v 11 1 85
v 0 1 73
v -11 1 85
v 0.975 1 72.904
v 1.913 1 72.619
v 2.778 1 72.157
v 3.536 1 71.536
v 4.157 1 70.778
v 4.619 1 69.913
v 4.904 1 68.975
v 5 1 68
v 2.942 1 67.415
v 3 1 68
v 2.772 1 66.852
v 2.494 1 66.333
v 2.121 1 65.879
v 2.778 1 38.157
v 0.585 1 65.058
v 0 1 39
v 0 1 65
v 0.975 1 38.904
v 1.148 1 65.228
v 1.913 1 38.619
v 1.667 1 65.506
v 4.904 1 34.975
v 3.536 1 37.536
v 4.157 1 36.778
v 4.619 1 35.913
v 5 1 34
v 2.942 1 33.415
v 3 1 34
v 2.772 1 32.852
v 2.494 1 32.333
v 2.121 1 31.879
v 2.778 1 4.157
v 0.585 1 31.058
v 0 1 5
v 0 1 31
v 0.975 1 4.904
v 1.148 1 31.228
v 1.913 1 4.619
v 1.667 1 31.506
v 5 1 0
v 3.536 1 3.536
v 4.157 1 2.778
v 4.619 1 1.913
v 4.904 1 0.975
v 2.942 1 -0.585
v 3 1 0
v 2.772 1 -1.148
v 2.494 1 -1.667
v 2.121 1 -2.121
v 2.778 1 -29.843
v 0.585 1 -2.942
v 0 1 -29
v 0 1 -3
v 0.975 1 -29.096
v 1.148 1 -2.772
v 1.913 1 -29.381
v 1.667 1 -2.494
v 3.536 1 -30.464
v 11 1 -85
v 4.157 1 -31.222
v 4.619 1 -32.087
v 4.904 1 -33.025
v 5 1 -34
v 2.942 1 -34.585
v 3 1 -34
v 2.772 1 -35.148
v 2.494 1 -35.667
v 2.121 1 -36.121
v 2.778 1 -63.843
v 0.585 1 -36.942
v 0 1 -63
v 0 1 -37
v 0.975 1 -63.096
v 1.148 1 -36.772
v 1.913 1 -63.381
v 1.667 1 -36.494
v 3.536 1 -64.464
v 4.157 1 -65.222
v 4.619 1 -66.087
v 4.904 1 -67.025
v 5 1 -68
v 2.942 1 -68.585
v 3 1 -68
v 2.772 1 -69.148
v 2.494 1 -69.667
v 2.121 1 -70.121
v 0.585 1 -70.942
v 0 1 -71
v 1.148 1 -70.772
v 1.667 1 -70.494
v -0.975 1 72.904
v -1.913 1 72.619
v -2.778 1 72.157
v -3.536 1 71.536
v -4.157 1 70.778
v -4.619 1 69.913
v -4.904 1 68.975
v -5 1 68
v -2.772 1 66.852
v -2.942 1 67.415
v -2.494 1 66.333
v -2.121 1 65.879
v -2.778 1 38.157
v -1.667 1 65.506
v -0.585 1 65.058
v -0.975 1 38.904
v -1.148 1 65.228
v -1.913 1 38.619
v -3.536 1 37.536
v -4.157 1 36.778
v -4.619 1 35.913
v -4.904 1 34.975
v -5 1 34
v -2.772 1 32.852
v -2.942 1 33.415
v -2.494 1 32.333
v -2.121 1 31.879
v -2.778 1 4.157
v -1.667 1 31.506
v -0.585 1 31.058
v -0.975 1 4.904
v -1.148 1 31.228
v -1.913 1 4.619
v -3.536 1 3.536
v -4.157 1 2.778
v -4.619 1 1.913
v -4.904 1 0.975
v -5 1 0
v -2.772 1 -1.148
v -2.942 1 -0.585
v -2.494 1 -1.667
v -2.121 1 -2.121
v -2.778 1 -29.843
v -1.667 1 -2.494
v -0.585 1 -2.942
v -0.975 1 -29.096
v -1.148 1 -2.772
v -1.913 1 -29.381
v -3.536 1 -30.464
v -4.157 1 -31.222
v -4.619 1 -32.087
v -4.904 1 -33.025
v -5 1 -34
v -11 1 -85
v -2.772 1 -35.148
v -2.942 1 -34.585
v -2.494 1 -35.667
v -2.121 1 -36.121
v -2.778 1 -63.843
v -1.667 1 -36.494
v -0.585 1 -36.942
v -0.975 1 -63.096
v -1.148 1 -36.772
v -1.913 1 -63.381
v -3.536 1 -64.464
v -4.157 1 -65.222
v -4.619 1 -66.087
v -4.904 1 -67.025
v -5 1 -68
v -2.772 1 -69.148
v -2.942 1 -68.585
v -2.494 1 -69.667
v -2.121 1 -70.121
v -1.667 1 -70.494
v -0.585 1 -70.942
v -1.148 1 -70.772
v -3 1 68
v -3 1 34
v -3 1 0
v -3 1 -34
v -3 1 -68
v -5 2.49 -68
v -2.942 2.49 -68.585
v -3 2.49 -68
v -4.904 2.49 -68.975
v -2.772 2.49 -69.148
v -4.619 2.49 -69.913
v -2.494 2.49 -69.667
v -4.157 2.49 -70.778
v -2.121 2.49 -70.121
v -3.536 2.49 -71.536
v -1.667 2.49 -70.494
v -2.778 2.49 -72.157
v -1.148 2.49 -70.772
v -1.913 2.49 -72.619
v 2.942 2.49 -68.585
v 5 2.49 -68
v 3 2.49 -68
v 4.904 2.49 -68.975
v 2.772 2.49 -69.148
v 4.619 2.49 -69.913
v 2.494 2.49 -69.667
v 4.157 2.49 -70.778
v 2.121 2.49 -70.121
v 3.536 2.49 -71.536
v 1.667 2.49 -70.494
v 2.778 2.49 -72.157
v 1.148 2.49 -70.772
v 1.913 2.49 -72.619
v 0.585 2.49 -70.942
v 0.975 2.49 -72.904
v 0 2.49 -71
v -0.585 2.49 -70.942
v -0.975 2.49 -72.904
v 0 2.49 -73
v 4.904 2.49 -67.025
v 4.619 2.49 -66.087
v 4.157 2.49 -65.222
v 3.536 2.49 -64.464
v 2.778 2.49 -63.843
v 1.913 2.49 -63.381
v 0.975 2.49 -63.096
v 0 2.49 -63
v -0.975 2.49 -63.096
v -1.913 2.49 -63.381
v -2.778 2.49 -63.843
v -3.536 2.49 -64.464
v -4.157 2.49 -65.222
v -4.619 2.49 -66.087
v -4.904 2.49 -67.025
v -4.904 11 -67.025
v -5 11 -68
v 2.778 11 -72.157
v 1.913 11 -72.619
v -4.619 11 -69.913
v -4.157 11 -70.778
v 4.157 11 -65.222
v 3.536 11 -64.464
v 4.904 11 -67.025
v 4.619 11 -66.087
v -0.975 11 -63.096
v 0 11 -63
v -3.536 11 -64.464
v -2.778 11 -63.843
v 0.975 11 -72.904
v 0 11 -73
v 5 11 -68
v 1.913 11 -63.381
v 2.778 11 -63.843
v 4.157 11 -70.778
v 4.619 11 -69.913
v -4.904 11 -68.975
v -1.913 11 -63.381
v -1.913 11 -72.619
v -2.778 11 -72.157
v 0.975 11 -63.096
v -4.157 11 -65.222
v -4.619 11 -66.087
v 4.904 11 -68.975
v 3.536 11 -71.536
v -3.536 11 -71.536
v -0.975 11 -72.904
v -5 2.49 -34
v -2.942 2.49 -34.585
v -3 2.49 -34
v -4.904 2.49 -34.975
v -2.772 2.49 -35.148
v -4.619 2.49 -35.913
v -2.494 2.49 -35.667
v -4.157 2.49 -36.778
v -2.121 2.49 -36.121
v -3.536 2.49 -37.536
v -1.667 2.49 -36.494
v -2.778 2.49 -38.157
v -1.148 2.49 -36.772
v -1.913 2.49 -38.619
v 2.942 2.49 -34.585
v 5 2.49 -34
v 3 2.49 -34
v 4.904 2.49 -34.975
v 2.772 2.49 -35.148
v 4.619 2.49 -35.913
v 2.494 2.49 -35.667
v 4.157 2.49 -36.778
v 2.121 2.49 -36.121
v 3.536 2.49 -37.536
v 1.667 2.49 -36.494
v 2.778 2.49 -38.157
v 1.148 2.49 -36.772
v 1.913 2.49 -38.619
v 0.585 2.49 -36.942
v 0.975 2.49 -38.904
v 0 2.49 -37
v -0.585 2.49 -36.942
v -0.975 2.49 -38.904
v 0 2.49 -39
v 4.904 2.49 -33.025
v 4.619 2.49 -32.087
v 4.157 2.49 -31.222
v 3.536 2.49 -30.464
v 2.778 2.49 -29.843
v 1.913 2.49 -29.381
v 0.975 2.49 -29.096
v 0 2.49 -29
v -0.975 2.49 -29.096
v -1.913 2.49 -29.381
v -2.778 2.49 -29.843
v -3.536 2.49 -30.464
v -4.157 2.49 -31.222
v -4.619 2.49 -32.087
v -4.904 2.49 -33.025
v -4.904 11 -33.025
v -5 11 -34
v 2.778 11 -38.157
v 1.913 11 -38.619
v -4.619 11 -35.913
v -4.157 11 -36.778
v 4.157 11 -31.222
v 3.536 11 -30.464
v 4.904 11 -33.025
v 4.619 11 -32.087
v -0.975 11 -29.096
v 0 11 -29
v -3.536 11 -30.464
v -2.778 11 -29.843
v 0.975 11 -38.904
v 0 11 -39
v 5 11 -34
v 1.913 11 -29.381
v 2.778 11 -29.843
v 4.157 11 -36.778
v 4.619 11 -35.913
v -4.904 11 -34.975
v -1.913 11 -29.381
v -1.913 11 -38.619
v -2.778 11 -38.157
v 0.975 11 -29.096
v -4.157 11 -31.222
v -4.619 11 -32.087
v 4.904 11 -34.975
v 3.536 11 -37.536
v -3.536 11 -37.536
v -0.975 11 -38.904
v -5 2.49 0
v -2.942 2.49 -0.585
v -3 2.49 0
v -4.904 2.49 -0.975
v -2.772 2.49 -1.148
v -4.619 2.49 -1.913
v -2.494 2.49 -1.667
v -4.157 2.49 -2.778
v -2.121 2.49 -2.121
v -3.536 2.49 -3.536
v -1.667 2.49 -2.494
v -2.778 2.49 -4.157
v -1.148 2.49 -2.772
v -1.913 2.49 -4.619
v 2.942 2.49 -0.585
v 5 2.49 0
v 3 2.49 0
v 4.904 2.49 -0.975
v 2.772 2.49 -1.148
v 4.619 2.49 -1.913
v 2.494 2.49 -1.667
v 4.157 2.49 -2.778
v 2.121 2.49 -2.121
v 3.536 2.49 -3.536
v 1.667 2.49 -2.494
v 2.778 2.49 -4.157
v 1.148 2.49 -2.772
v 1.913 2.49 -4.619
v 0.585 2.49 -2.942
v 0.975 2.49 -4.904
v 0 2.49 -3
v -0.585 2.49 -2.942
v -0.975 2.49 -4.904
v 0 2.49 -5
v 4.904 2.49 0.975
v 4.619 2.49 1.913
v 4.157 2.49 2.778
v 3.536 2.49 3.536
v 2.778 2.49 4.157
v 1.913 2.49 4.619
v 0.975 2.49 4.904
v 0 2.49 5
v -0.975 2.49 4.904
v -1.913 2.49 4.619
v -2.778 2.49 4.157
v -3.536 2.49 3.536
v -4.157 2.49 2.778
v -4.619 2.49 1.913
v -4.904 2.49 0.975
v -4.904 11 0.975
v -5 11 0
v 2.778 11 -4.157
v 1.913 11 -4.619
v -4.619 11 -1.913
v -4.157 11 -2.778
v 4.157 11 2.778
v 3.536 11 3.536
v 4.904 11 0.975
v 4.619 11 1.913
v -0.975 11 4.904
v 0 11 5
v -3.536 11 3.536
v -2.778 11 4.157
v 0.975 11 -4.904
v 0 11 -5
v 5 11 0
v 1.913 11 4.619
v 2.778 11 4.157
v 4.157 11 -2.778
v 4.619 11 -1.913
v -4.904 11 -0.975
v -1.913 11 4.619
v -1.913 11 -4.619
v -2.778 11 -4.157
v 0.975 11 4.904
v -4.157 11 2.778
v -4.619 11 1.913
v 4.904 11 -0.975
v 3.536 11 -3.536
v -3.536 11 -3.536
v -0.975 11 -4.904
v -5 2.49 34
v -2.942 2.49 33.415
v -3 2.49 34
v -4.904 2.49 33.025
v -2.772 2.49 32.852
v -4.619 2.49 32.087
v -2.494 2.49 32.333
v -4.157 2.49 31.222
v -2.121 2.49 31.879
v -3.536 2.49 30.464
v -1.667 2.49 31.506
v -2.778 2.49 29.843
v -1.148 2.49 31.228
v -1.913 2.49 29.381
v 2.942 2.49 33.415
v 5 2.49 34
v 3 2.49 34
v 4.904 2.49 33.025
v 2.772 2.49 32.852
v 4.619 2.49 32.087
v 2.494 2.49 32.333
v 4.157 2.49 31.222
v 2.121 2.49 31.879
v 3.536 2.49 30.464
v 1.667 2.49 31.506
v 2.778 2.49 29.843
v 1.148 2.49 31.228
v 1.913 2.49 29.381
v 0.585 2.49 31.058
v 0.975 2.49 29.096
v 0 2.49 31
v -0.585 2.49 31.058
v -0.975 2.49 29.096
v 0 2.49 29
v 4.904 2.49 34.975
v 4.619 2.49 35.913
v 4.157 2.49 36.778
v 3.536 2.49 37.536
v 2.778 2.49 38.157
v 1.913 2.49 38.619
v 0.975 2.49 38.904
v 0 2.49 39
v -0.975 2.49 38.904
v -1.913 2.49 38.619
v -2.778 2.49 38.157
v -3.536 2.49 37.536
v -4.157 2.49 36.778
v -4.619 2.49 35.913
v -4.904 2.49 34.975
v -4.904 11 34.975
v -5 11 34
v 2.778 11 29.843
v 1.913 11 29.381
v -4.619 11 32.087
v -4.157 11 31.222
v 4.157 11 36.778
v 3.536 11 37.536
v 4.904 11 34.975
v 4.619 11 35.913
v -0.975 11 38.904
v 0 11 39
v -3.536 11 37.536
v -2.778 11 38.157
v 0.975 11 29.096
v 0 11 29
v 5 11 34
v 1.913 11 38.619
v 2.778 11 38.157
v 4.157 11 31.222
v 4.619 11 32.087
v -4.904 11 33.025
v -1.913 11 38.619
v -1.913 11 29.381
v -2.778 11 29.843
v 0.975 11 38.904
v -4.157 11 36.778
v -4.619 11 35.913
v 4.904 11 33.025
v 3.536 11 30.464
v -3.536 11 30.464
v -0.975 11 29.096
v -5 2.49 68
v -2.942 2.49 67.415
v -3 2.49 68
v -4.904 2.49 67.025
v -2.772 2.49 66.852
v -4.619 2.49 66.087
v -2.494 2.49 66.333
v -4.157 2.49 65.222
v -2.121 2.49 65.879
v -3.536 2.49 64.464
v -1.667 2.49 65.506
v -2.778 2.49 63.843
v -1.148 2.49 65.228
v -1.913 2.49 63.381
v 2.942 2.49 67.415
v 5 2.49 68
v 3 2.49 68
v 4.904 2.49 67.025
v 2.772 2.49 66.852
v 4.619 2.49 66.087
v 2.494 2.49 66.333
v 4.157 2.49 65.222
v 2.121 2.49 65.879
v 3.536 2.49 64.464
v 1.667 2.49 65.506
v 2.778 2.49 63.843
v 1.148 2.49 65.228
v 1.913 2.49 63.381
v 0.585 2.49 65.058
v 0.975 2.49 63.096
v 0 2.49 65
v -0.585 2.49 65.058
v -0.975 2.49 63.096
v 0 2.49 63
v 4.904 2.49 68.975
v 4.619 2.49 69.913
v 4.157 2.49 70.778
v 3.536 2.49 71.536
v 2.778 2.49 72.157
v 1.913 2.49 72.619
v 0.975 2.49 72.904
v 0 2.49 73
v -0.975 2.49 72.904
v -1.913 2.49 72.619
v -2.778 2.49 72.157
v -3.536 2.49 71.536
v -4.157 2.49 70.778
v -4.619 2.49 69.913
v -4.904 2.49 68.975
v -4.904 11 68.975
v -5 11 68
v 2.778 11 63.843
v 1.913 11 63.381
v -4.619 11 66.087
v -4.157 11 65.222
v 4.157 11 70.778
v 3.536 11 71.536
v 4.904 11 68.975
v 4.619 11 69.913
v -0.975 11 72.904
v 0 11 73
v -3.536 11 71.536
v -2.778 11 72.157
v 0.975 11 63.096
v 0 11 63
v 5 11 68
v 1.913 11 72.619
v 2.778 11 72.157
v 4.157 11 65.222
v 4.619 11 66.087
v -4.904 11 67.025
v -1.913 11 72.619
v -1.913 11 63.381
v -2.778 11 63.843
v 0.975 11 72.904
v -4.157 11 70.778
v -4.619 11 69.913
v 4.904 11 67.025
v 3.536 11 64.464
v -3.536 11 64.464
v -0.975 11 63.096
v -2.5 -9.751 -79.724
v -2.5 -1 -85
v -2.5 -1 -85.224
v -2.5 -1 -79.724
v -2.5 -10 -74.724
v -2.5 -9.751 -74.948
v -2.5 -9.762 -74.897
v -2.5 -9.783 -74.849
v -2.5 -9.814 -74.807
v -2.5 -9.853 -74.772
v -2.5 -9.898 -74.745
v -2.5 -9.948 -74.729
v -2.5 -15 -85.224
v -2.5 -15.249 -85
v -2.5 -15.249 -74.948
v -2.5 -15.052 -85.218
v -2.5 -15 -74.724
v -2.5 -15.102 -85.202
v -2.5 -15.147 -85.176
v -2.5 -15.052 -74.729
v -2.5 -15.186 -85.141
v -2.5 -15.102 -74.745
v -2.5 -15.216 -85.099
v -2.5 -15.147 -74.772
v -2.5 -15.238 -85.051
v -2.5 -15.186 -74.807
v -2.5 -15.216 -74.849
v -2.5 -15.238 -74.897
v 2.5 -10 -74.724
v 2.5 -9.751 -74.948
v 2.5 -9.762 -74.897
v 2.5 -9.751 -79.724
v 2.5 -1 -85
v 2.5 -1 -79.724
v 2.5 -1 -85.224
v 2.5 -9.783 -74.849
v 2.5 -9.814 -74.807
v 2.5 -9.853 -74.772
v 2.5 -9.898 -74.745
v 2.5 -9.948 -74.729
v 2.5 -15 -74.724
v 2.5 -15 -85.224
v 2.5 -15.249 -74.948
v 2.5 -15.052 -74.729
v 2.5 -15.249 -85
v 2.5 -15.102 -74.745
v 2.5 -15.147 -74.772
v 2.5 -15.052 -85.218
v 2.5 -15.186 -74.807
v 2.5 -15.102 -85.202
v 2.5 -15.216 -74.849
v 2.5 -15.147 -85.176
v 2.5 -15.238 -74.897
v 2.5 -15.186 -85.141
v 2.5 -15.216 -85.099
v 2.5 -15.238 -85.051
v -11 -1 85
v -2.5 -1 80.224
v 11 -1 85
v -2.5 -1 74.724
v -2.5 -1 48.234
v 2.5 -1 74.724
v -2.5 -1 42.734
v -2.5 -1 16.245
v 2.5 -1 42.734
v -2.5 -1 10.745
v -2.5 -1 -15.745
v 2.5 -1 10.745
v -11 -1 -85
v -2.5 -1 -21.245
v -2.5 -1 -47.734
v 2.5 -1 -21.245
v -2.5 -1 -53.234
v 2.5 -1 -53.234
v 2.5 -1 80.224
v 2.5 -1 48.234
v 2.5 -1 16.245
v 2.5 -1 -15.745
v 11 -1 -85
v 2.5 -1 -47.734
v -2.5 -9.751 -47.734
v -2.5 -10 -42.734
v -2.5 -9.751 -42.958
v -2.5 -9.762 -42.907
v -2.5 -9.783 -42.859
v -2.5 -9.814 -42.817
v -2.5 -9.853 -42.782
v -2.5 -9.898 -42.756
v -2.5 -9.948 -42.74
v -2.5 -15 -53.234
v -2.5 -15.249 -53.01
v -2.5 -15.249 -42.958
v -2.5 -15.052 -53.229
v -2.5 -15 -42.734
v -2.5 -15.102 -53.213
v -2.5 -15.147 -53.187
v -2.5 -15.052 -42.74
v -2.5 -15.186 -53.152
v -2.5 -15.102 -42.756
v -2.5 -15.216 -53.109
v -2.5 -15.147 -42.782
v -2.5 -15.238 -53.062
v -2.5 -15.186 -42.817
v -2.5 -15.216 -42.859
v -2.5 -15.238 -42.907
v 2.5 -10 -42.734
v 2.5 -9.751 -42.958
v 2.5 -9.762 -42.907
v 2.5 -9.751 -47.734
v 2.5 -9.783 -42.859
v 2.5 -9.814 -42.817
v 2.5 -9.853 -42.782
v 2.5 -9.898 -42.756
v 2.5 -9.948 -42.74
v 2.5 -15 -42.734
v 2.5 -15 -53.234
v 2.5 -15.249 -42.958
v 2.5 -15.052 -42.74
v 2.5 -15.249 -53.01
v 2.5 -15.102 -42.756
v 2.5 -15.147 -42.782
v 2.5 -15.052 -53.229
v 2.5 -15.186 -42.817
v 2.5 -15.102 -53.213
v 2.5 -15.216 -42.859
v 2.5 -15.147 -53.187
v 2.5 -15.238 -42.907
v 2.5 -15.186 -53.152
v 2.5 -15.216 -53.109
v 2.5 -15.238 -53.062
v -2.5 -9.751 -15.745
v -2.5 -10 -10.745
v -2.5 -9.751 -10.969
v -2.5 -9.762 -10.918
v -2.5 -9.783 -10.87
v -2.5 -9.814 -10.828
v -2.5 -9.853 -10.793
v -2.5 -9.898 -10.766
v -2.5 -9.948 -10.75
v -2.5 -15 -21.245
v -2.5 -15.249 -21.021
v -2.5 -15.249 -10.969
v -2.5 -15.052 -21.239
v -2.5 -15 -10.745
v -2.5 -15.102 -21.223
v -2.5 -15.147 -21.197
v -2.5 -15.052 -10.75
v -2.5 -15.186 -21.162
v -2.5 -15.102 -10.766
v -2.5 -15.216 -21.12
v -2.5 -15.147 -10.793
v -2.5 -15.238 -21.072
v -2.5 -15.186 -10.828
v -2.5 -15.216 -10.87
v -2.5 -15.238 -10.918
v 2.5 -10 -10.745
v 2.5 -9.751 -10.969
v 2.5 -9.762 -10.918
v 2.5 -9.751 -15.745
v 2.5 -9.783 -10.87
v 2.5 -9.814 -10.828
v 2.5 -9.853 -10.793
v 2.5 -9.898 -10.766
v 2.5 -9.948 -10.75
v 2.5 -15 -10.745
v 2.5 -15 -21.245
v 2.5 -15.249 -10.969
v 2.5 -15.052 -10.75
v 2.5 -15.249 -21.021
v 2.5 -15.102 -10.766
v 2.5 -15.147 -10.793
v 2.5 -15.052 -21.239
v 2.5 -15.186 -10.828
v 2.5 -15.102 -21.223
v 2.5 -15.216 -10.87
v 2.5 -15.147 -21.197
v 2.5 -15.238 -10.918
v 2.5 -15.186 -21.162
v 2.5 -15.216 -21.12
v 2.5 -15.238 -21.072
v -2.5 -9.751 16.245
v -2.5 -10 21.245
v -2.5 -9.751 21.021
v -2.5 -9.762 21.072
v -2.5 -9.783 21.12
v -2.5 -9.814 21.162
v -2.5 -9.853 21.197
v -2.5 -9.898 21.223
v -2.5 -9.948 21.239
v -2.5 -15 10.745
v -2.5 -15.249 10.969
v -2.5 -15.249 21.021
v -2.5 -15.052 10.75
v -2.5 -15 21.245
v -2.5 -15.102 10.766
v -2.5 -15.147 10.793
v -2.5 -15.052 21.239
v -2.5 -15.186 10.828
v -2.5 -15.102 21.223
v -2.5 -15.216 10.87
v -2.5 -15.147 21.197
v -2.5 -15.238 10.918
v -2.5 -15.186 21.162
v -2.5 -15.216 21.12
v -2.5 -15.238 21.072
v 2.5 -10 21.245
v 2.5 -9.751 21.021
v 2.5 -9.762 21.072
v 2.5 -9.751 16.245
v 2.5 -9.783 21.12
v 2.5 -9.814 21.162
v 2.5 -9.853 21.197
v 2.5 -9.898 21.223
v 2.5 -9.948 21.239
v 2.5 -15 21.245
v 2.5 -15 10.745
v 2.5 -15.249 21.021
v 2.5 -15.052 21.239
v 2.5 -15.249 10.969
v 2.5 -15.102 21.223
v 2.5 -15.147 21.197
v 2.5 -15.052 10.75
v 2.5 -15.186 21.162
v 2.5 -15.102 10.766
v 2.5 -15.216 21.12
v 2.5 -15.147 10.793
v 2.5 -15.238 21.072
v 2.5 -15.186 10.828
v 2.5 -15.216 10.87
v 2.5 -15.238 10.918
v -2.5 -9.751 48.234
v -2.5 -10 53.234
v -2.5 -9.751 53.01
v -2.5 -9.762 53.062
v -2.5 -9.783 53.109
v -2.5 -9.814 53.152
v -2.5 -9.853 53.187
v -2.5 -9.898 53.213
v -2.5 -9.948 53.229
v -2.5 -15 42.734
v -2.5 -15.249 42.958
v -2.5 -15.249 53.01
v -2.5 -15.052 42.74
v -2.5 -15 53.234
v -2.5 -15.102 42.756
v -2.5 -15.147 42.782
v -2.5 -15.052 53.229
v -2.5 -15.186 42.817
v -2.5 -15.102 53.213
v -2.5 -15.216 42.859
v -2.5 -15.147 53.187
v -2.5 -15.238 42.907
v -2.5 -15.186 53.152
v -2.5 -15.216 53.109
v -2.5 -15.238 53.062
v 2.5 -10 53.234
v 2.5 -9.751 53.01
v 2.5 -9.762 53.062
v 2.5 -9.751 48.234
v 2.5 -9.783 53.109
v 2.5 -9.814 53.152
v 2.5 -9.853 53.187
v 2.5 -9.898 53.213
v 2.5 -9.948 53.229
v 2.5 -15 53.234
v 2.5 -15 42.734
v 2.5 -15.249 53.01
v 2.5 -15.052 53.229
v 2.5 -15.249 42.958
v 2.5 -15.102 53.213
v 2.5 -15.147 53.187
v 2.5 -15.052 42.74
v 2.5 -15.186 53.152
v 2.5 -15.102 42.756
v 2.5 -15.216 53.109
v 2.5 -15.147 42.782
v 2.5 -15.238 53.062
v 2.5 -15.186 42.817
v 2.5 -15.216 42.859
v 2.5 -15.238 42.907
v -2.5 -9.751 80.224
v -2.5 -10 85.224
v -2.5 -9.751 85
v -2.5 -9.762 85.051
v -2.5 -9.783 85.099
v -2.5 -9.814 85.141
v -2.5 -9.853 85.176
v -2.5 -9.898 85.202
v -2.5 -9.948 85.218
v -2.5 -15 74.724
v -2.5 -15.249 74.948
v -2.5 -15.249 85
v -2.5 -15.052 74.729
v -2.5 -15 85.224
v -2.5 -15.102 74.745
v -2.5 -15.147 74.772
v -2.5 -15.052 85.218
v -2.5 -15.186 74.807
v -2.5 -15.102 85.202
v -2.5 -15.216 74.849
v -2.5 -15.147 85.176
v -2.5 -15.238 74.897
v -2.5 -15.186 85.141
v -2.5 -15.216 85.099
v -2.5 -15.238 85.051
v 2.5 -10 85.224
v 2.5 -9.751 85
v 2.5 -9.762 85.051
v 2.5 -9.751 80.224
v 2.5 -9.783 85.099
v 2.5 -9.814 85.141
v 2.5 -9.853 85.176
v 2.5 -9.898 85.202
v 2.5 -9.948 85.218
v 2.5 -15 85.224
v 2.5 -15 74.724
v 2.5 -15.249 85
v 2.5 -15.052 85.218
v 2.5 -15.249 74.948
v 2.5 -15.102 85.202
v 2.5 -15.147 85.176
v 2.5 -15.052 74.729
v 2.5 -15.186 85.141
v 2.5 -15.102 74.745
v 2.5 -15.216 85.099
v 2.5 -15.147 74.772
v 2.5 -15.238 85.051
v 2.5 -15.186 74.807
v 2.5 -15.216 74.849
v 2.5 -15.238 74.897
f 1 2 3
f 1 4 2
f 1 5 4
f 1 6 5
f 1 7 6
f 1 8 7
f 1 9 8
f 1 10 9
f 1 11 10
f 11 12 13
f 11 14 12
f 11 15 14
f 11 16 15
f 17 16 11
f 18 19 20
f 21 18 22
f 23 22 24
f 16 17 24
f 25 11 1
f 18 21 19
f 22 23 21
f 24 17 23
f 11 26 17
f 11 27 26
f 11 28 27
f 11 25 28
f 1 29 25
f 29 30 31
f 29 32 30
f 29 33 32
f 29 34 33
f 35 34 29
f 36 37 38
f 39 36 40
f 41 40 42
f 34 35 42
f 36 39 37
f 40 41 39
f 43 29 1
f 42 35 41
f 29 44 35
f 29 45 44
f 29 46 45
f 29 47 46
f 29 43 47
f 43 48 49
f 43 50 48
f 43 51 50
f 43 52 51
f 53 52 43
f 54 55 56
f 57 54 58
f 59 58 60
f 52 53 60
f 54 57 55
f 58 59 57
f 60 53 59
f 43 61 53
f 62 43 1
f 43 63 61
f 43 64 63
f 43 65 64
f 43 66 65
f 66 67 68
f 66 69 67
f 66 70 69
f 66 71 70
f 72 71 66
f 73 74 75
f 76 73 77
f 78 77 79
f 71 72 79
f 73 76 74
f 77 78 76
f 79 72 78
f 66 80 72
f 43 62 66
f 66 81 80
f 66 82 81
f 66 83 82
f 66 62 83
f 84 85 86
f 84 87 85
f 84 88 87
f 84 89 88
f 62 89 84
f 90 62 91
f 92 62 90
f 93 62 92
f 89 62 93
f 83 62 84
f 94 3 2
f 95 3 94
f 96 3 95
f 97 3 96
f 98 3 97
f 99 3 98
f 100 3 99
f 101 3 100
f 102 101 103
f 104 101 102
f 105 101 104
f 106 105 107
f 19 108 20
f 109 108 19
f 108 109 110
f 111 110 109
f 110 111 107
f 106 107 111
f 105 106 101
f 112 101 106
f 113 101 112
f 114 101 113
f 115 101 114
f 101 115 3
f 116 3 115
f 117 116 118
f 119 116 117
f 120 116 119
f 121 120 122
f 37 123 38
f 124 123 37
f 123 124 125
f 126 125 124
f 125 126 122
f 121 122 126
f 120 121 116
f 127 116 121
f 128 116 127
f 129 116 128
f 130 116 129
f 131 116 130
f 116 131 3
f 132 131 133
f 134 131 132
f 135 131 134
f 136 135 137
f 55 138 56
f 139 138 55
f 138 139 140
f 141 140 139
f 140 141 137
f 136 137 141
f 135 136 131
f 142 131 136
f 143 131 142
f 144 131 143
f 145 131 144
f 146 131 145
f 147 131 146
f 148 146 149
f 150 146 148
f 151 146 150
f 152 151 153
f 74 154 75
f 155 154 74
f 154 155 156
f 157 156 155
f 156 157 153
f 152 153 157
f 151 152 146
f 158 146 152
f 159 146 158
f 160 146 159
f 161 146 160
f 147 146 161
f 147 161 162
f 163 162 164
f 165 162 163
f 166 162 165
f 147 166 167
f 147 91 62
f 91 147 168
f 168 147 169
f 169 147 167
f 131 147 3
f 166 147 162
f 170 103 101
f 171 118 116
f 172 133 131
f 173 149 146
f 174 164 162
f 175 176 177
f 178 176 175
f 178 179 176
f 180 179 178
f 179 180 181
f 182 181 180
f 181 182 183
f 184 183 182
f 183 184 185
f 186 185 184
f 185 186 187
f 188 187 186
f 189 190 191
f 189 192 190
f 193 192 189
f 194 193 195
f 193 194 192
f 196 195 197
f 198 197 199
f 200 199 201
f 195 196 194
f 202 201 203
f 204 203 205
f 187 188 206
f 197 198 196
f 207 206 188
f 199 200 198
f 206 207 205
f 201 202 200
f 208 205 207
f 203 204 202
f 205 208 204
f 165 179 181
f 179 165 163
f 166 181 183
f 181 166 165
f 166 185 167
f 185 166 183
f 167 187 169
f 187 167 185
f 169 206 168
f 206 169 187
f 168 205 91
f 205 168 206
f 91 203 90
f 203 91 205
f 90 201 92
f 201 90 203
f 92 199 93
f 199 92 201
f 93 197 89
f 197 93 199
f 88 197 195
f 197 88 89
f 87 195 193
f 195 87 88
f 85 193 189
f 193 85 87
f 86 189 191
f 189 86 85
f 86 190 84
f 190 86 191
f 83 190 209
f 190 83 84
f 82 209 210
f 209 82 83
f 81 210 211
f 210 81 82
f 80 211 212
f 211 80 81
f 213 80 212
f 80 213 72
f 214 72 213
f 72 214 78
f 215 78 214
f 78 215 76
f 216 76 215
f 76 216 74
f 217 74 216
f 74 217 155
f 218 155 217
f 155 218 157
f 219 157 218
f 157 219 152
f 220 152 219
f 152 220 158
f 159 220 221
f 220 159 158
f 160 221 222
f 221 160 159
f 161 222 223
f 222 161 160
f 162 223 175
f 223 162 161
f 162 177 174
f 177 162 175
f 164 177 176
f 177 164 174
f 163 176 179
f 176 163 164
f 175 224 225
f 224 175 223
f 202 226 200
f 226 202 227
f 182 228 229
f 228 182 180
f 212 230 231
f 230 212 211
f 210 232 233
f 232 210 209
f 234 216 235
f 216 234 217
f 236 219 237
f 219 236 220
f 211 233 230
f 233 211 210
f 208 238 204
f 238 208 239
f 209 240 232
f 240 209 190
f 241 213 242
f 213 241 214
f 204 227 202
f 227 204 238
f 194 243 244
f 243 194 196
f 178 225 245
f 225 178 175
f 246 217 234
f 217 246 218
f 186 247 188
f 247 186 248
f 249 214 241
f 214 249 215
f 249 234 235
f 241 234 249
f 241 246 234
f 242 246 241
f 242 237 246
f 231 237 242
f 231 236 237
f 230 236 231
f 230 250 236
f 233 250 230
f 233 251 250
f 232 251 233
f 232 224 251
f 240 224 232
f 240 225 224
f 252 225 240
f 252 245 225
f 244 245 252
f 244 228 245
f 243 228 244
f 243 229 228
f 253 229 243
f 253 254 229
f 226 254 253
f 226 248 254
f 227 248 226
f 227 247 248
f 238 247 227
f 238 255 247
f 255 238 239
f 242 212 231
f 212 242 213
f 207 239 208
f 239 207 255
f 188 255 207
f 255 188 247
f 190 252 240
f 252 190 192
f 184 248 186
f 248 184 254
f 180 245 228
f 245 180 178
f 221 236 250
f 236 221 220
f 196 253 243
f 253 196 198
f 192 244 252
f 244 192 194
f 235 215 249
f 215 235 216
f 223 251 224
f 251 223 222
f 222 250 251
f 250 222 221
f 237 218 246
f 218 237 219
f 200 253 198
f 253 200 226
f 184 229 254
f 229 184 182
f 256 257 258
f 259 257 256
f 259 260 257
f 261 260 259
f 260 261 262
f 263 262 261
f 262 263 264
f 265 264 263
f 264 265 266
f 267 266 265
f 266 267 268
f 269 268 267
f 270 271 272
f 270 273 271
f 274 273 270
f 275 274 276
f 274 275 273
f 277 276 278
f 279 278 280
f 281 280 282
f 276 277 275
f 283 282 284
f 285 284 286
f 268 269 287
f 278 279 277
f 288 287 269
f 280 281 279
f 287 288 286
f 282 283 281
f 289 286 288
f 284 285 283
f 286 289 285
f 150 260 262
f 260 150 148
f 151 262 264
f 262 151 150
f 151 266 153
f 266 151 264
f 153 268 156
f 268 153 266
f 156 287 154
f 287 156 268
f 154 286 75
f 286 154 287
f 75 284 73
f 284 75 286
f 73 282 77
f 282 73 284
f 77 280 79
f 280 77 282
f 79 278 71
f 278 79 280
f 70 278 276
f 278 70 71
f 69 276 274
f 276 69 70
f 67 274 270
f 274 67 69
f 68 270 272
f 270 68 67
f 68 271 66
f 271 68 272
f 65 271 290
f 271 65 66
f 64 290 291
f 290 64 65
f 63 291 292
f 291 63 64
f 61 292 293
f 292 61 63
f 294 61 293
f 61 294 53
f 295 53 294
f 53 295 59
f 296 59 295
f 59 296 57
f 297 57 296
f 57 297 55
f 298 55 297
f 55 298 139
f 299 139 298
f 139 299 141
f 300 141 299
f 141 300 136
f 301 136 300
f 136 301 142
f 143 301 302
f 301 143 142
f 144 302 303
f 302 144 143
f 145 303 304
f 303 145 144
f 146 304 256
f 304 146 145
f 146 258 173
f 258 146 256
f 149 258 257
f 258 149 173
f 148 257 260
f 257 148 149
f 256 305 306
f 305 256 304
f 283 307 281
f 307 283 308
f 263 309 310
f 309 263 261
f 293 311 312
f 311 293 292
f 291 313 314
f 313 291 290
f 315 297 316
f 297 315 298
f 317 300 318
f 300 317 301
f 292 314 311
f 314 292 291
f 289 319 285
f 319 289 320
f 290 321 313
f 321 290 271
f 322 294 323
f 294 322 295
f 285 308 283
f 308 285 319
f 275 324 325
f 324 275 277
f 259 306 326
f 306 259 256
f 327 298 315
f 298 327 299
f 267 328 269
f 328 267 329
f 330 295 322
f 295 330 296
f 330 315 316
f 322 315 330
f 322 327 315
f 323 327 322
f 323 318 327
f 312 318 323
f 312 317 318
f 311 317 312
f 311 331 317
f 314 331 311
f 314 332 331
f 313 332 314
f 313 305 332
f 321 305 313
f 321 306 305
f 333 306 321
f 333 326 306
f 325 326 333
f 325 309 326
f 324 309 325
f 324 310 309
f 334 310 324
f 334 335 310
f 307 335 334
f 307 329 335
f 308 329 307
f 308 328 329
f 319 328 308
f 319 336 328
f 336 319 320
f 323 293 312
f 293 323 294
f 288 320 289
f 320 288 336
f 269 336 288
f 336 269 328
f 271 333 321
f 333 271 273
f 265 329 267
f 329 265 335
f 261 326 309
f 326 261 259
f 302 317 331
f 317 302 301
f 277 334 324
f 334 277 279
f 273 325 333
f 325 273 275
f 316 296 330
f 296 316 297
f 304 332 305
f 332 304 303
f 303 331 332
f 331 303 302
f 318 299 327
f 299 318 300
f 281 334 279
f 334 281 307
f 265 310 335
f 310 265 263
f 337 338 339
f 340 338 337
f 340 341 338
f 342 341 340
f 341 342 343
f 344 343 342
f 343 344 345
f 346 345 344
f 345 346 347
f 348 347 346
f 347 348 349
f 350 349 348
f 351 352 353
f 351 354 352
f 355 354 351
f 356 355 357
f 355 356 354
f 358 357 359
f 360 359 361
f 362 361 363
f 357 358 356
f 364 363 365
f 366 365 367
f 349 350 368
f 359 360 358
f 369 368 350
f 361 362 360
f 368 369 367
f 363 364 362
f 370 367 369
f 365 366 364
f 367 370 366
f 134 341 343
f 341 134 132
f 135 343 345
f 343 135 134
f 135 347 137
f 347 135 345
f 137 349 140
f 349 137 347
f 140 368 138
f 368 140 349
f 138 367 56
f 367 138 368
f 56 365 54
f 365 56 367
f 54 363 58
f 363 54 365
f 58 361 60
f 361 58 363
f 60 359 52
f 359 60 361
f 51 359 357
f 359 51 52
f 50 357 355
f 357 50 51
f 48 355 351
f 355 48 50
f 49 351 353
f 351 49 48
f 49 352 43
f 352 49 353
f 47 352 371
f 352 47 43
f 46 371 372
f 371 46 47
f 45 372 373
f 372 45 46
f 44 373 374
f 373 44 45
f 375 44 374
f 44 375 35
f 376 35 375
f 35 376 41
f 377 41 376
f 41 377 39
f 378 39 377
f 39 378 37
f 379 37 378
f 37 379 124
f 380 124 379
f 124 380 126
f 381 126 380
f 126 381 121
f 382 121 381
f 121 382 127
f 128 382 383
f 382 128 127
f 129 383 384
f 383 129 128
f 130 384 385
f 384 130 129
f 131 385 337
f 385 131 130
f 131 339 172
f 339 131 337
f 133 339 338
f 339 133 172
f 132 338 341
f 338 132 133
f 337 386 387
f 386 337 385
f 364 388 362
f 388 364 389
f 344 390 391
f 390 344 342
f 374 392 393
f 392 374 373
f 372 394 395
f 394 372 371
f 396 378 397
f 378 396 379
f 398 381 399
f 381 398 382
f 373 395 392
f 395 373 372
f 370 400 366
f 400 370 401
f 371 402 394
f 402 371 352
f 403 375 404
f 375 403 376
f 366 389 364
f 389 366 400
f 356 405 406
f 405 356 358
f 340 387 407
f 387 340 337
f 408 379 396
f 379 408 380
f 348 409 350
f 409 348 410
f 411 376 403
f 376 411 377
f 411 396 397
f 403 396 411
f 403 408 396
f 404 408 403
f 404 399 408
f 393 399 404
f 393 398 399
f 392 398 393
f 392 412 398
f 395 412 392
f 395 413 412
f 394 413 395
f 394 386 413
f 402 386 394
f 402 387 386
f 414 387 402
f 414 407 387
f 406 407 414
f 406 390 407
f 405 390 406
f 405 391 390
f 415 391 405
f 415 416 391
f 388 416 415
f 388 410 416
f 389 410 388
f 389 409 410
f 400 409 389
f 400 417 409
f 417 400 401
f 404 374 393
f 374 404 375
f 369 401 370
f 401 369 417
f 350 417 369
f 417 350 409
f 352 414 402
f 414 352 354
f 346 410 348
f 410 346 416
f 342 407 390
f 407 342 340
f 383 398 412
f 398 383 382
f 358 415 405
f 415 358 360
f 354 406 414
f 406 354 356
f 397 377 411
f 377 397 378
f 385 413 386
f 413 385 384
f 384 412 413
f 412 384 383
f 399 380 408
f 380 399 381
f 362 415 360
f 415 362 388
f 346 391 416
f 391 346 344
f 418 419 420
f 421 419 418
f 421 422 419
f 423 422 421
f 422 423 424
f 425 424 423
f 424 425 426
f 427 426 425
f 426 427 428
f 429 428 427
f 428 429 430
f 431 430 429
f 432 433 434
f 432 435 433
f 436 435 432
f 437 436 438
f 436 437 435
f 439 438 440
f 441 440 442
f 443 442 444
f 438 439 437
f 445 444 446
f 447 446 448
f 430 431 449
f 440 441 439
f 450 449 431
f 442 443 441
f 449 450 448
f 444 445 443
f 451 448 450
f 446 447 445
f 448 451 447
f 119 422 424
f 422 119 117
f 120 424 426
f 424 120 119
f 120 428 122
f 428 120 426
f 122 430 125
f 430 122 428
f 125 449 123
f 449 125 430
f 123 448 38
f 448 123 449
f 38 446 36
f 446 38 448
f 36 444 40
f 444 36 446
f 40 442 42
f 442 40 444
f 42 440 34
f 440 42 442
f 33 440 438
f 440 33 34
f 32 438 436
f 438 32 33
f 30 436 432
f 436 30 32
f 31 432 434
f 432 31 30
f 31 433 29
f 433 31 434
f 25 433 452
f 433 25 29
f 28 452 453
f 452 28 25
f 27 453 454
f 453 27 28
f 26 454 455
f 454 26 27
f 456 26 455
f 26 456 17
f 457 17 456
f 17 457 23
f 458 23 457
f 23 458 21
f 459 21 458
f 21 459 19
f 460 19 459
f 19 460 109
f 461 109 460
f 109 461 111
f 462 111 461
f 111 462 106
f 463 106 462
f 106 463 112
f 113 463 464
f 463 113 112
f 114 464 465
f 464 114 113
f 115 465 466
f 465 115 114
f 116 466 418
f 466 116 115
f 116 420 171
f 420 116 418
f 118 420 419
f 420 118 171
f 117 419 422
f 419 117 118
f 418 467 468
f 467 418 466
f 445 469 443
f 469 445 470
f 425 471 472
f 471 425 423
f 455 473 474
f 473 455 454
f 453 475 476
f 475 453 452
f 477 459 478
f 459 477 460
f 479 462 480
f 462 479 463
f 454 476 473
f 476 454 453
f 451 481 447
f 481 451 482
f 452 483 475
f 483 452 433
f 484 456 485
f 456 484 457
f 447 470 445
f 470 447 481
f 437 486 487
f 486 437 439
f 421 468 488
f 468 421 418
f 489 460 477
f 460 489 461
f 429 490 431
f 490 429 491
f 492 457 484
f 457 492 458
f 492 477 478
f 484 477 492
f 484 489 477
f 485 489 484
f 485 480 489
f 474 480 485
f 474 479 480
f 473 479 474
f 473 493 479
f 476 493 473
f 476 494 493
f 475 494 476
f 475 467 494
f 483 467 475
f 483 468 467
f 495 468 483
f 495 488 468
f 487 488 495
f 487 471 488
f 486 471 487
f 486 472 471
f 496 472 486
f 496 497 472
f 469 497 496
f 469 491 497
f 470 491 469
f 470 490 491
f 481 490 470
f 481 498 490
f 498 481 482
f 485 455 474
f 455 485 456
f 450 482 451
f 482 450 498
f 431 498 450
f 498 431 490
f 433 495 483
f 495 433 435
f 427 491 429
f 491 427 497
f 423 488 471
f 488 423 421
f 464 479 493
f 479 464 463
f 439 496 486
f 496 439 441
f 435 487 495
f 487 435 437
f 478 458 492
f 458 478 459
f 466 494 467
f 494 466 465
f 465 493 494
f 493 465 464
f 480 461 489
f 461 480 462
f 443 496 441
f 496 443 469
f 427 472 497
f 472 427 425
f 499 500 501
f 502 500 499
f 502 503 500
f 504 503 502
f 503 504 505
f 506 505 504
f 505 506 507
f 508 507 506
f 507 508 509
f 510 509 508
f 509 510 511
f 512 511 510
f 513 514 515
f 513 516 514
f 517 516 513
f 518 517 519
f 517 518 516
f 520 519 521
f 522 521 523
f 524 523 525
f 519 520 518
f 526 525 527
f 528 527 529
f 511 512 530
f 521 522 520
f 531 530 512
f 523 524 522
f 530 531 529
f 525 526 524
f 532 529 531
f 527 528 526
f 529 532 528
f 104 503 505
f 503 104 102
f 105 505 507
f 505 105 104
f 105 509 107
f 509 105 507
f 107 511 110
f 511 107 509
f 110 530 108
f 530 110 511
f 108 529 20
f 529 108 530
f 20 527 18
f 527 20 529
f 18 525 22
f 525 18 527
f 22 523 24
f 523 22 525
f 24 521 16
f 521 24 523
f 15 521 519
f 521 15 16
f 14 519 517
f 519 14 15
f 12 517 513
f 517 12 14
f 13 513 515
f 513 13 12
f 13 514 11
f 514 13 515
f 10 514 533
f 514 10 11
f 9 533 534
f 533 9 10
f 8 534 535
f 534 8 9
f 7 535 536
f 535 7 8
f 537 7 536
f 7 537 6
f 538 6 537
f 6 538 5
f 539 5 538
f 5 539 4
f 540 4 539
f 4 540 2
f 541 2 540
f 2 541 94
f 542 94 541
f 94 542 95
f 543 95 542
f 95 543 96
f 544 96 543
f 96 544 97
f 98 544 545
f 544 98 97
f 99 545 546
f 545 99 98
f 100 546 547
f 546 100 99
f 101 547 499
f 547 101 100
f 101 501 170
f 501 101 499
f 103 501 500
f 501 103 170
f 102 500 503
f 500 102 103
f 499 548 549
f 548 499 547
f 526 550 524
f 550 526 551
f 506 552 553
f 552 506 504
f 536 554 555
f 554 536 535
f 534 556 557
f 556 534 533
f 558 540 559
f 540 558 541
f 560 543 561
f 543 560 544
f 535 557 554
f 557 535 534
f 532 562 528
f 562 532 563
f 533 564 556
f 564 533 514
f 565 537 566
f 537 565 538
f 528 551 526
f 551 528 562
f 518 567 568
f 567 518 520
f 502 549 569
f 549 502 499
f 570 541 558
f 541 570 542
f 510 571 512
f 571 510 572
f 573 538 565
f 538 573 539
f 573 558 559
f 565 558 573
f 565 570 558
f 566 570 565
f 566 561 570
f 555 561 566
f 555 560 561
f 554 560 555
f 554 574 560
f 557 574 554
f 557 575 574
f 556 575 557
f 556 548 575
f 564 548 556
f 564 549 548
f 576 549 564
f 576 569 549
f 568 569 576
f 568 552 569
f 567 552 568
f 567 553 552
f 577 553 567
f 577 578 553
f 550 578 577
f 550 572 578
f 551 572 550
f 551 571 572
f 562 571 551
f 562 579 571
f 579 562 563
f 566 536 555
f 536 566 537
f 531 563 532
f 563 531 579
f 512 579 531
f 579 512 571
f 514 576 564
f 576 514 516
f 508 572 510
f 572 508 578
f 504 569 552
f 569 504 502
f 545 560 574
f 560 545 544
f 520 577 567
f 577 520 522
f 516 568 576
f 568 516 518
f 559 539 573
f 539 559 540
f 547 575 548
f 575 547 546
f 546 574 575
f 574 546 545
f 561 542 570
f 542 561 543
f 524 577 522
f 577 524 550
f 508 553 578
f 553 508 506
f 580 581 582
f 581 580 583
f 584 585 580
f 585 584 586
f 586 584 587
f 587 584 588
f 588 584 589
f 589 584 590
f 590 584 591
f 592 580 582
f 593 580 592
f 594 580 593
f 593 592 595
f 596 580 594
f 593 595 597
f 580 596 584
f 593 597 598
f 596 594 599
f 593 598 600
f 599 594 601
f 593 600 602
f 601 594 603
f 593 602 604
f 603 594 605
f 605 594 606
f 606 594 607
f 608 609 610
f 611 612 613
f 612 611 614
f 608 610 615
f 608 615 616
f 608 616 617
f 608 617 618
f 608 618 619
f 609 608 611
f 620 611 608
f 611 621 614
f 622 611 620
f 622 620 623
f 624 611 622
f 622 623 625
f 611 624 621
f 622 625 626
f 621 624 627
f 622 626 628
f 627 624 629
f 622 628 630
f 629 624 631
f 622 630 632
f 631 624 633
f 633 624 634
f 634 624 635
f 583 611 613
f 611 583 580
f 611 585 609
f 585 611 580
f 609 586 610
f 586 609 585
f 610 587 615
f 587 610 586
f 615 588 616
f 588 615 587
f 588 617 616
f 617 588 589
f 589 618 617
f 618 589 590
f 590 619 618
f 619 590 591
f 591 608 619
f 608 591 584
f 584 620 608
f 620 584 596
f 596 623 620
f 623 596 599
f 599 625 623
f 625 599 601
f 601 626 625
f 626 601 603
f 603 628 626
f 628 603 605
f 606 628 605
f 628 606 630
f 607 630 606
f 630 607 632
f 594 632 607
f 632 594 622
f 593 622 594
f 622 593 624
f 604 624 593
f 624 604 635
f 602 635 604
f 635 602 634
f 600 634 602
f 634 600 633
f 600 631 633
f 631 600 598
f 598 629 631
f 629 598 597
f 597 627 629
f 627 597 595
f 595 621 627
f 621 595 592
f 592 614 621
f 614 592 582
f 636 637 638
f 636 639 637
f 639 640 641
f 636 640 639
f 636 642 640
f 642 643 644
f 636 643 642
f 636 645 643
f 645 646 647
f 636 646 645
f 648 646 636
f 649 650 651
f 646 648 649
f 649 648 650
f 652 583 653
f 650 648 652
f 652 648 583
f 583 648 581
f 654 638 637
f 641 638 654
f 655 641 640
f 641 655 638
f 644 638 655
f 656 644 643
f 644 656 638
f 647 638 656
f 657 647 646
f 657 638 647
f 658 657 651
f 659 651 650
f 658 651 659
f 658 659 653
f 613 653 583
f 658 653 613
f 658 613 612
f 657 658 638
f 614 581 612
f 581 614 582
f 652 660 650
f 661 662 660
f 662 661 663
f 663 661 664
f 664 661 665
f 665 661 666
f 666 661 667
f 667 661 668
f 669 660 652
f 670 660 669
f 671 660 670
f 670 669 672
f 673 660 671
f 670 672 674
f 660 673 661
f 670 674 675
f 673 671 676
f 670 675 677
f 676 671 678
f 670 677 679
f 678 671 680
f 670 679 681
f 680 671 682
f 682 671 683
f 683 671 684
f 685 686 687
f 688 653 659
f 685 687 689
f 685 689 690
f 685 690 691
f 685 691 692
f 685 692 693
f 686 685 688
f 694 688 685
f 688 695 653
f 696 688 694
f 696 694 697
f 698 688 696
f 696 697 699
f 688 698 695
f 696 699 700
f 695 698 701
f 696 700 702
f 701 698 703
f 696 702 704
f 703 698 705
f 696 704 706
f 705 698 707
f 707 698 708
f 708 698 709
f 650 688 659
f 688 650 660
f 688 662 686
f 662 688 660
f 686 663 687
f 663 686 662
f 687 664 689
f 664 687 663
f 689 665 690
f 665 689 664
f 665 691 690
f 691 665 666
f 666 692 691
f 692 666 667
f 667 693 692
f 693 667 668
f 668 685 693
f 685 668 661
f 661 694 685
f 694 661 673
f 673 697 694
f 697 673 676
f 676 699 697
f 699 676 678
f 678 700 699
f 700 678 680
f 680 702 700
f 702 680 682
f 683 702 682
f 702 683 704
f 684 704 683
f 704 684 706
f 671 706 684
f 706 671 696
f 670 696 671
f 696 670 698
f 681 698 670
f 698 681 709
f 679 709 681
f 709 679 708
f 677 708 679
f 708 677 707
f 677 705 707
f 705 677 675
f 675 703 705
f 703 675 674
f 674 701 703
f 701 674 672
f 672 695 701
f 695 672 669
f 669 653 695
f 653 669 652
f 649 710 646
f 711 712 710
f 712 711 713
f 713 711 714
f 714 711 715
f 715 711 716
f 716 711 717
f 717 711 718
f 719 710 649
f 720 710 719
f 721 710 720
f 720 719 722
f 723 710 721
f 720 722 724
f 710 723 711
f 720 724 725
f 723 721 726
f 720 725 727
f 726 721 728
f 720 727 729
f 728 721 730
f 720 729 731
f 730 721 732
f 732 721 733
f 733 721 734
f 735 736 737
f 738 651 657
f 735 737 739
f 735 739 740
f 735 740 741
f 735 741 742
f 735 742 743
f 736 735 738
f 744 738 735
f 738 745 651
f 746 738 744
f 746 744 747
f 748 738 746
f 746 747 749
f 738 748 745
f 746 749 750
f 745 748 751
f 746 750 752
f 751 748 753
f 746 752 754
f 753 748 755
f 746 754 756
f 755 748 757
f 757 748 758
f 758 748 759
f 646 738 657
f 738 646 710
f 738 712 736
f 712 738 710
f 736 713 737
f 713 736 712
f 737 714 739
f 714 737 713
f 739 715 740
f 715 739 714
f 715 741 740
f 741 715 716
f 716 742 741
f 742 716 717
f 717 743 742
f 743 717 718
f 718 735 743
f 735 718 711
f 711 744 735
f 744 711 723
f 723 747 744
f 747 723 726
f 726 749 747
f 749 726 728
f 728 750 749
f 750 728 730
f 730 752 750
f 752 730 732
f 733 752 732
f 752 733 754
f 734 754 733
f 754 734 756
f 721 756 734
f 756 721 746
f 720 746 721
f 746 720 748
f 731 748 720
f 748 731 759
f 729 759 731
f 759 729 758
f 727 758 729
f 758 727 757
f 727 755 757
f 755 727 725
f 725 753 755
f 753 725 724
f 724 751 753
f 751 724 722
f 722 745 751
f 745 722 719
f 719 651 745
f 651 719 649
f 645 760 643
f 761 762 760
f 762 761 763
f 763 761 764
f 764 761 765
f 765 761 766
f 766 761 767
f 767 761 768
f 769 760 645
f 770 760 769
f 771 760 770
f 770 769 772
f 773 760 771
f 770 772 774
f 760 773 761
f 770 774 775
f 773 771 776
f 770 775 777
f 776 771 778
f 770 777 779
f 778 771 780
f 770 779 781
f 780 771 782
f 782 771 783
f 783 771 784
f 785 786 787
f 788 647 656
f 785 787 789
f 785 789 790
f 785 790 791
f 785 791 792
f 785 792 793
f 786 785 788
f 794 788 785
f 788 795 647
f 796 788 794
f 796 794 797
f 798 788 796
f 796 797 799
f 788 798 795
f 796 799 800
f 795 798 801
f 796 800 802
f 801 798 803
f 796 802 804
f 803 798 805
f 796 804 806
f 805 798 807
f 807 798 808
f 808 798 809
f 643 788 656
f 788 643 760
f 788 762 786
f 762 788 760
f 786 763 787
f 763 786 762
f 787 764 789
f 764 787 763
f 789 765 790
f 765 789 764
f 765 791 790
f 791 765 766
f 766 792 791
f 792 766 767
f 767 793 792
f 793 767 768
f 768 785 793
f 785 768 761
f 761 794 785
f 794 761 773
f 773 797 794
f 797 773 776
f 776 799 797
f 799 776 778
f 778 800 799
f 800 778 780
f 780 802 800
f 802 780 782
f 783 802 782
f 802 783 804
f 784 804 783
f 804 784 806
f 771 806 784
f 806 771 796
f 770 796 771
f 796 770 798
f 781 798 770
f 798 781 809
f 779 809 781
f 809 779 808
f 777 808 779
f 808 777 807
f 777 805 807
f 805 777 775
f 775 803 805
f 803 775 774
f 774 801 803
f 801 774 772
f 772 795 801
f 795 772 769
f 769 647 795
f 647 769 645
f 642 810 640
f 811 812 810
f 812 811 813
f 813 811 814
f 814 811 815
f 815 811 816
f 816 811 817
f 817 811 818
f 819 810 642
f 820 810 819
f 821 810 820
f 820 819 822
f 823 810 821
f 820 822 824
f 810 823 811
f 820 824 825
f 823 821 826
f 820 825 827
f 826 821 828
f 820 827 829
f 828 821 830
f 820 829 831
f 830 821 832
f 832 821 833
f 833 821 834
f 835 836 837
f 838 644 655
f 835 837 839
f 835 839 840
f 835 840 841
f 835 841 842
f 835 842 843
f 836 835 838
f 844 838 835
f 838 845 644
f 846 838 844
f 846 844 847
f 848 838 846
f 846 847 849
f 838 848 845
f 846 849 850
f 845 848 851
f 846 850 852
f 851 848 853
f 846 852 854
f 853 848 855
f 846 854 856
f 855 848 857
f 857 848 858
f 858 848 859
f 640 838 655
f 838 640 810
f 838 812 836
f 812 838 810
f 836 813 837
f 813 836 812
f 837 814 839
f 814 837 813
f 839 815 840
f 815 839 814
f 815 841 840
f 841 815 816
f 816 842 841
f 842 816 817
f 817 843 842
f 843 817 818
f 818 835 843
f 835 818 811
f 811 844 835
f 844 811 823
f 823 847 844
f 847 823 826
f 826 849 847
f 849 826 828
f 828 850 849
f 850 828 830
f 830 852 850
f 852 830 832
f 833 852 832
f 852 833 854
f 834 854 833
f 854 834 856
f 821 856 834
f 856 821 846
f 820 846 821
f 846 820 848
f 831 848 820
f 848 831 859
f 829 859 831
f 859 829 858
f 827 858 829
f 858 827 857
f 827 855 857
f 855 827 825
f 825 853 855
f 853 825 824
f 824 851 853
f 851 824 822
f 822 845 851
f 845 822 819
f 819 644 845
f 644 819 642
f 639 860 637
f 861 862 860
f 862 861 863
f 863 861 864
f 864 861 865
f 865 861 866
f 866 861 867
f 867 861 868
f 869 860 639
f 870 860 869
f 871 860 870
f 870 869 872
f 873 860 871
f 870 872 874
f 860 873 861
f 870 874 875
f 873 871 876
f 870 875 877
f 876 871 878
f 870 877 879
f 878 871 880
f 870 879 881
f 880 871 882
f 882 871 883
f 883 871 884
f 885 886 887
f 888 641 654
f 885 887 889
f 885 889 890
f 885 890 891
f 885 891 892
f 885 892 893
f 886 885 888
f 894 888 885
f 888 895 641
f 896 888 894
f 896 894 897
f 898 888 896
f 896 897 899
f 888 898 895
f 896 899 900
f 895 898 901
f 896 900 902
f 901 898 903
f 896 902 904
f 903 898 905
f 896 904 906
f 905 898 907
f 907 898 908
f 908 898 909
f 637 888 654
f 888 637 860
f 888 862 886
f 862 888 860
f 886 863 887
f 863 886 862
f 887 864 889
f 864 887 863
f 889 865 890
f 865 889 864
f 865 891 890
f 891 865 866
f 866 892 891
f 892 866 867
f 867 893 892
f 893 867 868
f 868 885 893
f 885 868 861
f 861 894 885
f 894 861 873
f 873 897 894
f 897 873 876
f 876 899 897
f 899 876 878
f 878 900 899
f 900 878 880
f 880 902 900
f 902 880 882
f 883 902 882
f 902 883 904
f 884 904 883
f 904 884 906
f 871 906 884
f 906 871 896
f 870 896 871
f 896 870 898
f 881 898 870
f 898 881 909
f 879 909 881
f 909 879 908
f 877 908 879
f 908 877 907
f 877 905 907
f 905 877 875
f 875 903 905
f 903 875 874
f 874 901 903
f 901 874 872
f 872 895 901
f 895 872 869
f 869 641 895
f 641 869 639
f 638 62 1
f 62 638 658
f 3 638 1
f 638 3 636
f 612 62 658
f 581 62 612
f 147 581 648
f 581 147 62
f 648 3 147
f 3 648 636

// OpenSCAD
// file: ../peg-base-plates/peg-base-plates.scad
// Metal peg board base plate reconstructed from exported 3MF models.
//
// Customizer surface:
// - columns
// - rows
// - plateThickness
//
// Reuse from another file with:
// use <peg-base-plates.scad>
// pegBasePlate(columnCount = 2, rowCount = 2, boardThickness = 2);

/* [Plate] */

// Number of peg columns.
columns = 4; // [1:1:8]

// Number of peg rows.
rows = 2; // [1:1:6]

// Thickness of the plate body in millimeters.
plateThickness = 2; // [1:0.1:5]

/* [Hidden] */

pegDiameter = 10;
notchDiameter = 6;
pegLength = 10;
notchHeight = 1.49;

columnPitch = 22;
rowPitch = 32;

pegSegments = 32;
plateSingleSpan = 14;
plateEdgeMargin = 6;
plateTwoRowHeight = 46;

function plateWidth(columnCount) = columnCount == 1 ? plateSingleSpan : (columnCount - 1) * columnPitch + plateEdgeMargin * 2;
function plateHeight(rowCount) = rowCount == 1 ? plateSingleSpan : rowCount == 2 ? plateTwoRowHeight : rowCount * rowPitch - 18;

function columnCenter(columnIndex, columnCount) = (columnIndex - (columnCount - 1) / 2) * columnPitch;
function rowCenter(rowIndex, rowCount) = (rowIndex - (rowCount - 1) / 2) * rowPitch;

// Peg profile measured from the exported model.
// The small keyed notch near the plate lets the peg flex during insertion.
module pegNotchProfile() {
    union() {
        intersection() {
            circle(d = pegDiameter, $fn = pegSegments);
            translate([-pegDiameter / 2, 0])
                square([pegDiameter, pegDiameter / 2]);
        }

        intersection() {
            circle(d = notchDiameter, $fn = pegSegments);
            translate([-notchDiameter / 2, -notchDiameter / 2])
                square([notchDiameter, notchDiameter / 2]);
        }
    }
}

// Single peg with a short keyed notch at the plate end.
module peg() {
    rotate([90, 0, 0])
        linear_extrude(height = notchHeight)
            pegNotchProfile();

    translate([0, -notchHeight, 0])
        rotate([90, 0, 0])
            cylinder(h = pegLength - notchHeight, d = pegDiameter, $fn = pegSegments);
}

// Reusable plate module.
// columnCount: number of peg columns.
// rowCount: number of peg rows.
// boardThickness: thickness of the rectangular plate body.
module pegBasePlate(columnCount = columns, rowCount = rows, boardThickness = plateThickness) {
    boardWidth = plateWidth(columnCount);
    boardHeight = plateHeight(rowCount);

    union() {
        cube([boardWidth, boardThickness, boardHeight], center = true);

        for (rowIndex = [0 : rowCount - 1]) {
            for (columnIndex = [0 : columnCount - 1]) {
                translate([
                    columnCenter(columnIndex, columnCount),
                    -boardThickness / 2,
                    rowCenter(rowIndex, rowCount)
                ])
                    peg();
            }
        }
    }
}

// Standalone render using the current customizer values.
pegBasePlate();
// main file
// Metal peg board key holder reconstructed from exported meshes.
//
// This file reuses the peg geometry from peg-base-plates.scad.
// It can be rendered standalone and reused from other SCAD files.

use <../peg-base-plates/peg-base-plates.scad>

/* [Layout] */

// Number of pegs on the back side.
pegCount = 5; // [1:1:9]

// Number of front hooks.
hookCount = 6; // [1:1:12]

// Thickness of the rectangular back plate.
plateThickness = 2; // [1:0.1:5]

/* [Hidden] */

plateWidth = 22;
plateEdgeInset = 17;
hookWidth = 5;
hookBodyMinY = -15.24863;
hookBodyMidY = -9.75137;
hookBodyMaxY = -1;
hookLocalMinZ = -4.526131;
hookLocalMaxZ = 5.526131;
hookTopNotchStartZ = 0.75;

function plateHalfHeight(pegTotal) = pegTotal * plateEdgeInset;

function spreadCenter(index, count, minValue, maxValue) =
    count <= 1 ? 0 : minValue + (maxValue - minValue) * index / (count - 1);

function pegCenterZ(index, pegTotal, halfHeight) =
    spreadCenter(index, pegTotal, -halfHeight + plateEdgeInset, halfHeight - plateEdgeInset);

function hookCenterZ(index, hookTotal, halfHeight) =
    hookTotal <= 1
        ? 0
    : spreadCenter(index, hookTotal, -halfHeight - hookLocalMinZ, halfHeight - hookLocalMaxZ);

// Front hook body measured from exported geometry.
// The side profile below is taken from the 1hook-1peg mesh slice at x=2.5.
function hookProfilePoints() = [
    [hookBodyMaxY, -4.75],
    [hookBodyMaxY, hookTopNotchStartZ],
    [hookBodyMidY, hookTopNotchStartZ],
    [hookBodyMidY, hookLocalMaxZ],
    [-9.762237, 5.577253],
    [-9.783494, 5.625000],
    [-9.814215, 5.667282],
    [-9.853054, 5.702253],
    [-9.898316, 5.728386],
    [-9.948023, 5.744536],
    [-10.000000, 5.750000],
    [-15.000000, 5.750000],
    [-15.051977, 5.744536],
    [-15.101684, 5.728386],
    [-15.146946, 5.702253],
    [-15.185785, 5.667282],
    [-15.216506, 5.625000],
    [-15.237763, 5.577253],
    [hookBodyMinY, hookLocalMaxZ],
    [hookBodyMinY, hookLocalMinZ],
    [-15.237763, -4.577253],
    [-15.216506, -4.625000],
    [-15.185785, -4.667282],
    [-15.146946, -4.702253],
    [-15.101684, -4.728386],
    [-15.051977, -4.744536],
    [-15.000000, -4.750000],
    [hookBodyMaxY, -4.750000]
];

module keyHook() {
    rotate([90, 0, 90])
        linear_extrude(height = hookWidth, center = true)
            polygon(points = hookProfilePoints());
}

// Reusable key holder assembly.
// pegTotal: number of back pegs.
// hookTotal: number of front hooks.
// boardThickness: thickness of the plate.
module keyHolder(pegTotal = pegCount, hookTotal = hookCount, boardThickness = plateThickness) {
    halfHeight = plateHalfHeight(pegTotal);

    union() {
        cube([plateWidth, boardThickness, halfHeight * 2], center = true);

        // Back pegs (reuse geometry from peg-base-plates.scad).
        for (index = [0 : pegTotal - 1]) {
            translate([0, boardThickness / 2, pegCenterZ(index, pegTotal, halfHeight)])
                mirror([0, 1, 0])
                    peg();
        }

        // Front hooks.
        for (index = [0 : hookTotal - 1]) {
            translate([0, 0, hookCenterZ(index, hookTotal, halfHeight)])
                keyHook();
        }
    }
}

// Standalone render using customizer values.
keyHolder();
